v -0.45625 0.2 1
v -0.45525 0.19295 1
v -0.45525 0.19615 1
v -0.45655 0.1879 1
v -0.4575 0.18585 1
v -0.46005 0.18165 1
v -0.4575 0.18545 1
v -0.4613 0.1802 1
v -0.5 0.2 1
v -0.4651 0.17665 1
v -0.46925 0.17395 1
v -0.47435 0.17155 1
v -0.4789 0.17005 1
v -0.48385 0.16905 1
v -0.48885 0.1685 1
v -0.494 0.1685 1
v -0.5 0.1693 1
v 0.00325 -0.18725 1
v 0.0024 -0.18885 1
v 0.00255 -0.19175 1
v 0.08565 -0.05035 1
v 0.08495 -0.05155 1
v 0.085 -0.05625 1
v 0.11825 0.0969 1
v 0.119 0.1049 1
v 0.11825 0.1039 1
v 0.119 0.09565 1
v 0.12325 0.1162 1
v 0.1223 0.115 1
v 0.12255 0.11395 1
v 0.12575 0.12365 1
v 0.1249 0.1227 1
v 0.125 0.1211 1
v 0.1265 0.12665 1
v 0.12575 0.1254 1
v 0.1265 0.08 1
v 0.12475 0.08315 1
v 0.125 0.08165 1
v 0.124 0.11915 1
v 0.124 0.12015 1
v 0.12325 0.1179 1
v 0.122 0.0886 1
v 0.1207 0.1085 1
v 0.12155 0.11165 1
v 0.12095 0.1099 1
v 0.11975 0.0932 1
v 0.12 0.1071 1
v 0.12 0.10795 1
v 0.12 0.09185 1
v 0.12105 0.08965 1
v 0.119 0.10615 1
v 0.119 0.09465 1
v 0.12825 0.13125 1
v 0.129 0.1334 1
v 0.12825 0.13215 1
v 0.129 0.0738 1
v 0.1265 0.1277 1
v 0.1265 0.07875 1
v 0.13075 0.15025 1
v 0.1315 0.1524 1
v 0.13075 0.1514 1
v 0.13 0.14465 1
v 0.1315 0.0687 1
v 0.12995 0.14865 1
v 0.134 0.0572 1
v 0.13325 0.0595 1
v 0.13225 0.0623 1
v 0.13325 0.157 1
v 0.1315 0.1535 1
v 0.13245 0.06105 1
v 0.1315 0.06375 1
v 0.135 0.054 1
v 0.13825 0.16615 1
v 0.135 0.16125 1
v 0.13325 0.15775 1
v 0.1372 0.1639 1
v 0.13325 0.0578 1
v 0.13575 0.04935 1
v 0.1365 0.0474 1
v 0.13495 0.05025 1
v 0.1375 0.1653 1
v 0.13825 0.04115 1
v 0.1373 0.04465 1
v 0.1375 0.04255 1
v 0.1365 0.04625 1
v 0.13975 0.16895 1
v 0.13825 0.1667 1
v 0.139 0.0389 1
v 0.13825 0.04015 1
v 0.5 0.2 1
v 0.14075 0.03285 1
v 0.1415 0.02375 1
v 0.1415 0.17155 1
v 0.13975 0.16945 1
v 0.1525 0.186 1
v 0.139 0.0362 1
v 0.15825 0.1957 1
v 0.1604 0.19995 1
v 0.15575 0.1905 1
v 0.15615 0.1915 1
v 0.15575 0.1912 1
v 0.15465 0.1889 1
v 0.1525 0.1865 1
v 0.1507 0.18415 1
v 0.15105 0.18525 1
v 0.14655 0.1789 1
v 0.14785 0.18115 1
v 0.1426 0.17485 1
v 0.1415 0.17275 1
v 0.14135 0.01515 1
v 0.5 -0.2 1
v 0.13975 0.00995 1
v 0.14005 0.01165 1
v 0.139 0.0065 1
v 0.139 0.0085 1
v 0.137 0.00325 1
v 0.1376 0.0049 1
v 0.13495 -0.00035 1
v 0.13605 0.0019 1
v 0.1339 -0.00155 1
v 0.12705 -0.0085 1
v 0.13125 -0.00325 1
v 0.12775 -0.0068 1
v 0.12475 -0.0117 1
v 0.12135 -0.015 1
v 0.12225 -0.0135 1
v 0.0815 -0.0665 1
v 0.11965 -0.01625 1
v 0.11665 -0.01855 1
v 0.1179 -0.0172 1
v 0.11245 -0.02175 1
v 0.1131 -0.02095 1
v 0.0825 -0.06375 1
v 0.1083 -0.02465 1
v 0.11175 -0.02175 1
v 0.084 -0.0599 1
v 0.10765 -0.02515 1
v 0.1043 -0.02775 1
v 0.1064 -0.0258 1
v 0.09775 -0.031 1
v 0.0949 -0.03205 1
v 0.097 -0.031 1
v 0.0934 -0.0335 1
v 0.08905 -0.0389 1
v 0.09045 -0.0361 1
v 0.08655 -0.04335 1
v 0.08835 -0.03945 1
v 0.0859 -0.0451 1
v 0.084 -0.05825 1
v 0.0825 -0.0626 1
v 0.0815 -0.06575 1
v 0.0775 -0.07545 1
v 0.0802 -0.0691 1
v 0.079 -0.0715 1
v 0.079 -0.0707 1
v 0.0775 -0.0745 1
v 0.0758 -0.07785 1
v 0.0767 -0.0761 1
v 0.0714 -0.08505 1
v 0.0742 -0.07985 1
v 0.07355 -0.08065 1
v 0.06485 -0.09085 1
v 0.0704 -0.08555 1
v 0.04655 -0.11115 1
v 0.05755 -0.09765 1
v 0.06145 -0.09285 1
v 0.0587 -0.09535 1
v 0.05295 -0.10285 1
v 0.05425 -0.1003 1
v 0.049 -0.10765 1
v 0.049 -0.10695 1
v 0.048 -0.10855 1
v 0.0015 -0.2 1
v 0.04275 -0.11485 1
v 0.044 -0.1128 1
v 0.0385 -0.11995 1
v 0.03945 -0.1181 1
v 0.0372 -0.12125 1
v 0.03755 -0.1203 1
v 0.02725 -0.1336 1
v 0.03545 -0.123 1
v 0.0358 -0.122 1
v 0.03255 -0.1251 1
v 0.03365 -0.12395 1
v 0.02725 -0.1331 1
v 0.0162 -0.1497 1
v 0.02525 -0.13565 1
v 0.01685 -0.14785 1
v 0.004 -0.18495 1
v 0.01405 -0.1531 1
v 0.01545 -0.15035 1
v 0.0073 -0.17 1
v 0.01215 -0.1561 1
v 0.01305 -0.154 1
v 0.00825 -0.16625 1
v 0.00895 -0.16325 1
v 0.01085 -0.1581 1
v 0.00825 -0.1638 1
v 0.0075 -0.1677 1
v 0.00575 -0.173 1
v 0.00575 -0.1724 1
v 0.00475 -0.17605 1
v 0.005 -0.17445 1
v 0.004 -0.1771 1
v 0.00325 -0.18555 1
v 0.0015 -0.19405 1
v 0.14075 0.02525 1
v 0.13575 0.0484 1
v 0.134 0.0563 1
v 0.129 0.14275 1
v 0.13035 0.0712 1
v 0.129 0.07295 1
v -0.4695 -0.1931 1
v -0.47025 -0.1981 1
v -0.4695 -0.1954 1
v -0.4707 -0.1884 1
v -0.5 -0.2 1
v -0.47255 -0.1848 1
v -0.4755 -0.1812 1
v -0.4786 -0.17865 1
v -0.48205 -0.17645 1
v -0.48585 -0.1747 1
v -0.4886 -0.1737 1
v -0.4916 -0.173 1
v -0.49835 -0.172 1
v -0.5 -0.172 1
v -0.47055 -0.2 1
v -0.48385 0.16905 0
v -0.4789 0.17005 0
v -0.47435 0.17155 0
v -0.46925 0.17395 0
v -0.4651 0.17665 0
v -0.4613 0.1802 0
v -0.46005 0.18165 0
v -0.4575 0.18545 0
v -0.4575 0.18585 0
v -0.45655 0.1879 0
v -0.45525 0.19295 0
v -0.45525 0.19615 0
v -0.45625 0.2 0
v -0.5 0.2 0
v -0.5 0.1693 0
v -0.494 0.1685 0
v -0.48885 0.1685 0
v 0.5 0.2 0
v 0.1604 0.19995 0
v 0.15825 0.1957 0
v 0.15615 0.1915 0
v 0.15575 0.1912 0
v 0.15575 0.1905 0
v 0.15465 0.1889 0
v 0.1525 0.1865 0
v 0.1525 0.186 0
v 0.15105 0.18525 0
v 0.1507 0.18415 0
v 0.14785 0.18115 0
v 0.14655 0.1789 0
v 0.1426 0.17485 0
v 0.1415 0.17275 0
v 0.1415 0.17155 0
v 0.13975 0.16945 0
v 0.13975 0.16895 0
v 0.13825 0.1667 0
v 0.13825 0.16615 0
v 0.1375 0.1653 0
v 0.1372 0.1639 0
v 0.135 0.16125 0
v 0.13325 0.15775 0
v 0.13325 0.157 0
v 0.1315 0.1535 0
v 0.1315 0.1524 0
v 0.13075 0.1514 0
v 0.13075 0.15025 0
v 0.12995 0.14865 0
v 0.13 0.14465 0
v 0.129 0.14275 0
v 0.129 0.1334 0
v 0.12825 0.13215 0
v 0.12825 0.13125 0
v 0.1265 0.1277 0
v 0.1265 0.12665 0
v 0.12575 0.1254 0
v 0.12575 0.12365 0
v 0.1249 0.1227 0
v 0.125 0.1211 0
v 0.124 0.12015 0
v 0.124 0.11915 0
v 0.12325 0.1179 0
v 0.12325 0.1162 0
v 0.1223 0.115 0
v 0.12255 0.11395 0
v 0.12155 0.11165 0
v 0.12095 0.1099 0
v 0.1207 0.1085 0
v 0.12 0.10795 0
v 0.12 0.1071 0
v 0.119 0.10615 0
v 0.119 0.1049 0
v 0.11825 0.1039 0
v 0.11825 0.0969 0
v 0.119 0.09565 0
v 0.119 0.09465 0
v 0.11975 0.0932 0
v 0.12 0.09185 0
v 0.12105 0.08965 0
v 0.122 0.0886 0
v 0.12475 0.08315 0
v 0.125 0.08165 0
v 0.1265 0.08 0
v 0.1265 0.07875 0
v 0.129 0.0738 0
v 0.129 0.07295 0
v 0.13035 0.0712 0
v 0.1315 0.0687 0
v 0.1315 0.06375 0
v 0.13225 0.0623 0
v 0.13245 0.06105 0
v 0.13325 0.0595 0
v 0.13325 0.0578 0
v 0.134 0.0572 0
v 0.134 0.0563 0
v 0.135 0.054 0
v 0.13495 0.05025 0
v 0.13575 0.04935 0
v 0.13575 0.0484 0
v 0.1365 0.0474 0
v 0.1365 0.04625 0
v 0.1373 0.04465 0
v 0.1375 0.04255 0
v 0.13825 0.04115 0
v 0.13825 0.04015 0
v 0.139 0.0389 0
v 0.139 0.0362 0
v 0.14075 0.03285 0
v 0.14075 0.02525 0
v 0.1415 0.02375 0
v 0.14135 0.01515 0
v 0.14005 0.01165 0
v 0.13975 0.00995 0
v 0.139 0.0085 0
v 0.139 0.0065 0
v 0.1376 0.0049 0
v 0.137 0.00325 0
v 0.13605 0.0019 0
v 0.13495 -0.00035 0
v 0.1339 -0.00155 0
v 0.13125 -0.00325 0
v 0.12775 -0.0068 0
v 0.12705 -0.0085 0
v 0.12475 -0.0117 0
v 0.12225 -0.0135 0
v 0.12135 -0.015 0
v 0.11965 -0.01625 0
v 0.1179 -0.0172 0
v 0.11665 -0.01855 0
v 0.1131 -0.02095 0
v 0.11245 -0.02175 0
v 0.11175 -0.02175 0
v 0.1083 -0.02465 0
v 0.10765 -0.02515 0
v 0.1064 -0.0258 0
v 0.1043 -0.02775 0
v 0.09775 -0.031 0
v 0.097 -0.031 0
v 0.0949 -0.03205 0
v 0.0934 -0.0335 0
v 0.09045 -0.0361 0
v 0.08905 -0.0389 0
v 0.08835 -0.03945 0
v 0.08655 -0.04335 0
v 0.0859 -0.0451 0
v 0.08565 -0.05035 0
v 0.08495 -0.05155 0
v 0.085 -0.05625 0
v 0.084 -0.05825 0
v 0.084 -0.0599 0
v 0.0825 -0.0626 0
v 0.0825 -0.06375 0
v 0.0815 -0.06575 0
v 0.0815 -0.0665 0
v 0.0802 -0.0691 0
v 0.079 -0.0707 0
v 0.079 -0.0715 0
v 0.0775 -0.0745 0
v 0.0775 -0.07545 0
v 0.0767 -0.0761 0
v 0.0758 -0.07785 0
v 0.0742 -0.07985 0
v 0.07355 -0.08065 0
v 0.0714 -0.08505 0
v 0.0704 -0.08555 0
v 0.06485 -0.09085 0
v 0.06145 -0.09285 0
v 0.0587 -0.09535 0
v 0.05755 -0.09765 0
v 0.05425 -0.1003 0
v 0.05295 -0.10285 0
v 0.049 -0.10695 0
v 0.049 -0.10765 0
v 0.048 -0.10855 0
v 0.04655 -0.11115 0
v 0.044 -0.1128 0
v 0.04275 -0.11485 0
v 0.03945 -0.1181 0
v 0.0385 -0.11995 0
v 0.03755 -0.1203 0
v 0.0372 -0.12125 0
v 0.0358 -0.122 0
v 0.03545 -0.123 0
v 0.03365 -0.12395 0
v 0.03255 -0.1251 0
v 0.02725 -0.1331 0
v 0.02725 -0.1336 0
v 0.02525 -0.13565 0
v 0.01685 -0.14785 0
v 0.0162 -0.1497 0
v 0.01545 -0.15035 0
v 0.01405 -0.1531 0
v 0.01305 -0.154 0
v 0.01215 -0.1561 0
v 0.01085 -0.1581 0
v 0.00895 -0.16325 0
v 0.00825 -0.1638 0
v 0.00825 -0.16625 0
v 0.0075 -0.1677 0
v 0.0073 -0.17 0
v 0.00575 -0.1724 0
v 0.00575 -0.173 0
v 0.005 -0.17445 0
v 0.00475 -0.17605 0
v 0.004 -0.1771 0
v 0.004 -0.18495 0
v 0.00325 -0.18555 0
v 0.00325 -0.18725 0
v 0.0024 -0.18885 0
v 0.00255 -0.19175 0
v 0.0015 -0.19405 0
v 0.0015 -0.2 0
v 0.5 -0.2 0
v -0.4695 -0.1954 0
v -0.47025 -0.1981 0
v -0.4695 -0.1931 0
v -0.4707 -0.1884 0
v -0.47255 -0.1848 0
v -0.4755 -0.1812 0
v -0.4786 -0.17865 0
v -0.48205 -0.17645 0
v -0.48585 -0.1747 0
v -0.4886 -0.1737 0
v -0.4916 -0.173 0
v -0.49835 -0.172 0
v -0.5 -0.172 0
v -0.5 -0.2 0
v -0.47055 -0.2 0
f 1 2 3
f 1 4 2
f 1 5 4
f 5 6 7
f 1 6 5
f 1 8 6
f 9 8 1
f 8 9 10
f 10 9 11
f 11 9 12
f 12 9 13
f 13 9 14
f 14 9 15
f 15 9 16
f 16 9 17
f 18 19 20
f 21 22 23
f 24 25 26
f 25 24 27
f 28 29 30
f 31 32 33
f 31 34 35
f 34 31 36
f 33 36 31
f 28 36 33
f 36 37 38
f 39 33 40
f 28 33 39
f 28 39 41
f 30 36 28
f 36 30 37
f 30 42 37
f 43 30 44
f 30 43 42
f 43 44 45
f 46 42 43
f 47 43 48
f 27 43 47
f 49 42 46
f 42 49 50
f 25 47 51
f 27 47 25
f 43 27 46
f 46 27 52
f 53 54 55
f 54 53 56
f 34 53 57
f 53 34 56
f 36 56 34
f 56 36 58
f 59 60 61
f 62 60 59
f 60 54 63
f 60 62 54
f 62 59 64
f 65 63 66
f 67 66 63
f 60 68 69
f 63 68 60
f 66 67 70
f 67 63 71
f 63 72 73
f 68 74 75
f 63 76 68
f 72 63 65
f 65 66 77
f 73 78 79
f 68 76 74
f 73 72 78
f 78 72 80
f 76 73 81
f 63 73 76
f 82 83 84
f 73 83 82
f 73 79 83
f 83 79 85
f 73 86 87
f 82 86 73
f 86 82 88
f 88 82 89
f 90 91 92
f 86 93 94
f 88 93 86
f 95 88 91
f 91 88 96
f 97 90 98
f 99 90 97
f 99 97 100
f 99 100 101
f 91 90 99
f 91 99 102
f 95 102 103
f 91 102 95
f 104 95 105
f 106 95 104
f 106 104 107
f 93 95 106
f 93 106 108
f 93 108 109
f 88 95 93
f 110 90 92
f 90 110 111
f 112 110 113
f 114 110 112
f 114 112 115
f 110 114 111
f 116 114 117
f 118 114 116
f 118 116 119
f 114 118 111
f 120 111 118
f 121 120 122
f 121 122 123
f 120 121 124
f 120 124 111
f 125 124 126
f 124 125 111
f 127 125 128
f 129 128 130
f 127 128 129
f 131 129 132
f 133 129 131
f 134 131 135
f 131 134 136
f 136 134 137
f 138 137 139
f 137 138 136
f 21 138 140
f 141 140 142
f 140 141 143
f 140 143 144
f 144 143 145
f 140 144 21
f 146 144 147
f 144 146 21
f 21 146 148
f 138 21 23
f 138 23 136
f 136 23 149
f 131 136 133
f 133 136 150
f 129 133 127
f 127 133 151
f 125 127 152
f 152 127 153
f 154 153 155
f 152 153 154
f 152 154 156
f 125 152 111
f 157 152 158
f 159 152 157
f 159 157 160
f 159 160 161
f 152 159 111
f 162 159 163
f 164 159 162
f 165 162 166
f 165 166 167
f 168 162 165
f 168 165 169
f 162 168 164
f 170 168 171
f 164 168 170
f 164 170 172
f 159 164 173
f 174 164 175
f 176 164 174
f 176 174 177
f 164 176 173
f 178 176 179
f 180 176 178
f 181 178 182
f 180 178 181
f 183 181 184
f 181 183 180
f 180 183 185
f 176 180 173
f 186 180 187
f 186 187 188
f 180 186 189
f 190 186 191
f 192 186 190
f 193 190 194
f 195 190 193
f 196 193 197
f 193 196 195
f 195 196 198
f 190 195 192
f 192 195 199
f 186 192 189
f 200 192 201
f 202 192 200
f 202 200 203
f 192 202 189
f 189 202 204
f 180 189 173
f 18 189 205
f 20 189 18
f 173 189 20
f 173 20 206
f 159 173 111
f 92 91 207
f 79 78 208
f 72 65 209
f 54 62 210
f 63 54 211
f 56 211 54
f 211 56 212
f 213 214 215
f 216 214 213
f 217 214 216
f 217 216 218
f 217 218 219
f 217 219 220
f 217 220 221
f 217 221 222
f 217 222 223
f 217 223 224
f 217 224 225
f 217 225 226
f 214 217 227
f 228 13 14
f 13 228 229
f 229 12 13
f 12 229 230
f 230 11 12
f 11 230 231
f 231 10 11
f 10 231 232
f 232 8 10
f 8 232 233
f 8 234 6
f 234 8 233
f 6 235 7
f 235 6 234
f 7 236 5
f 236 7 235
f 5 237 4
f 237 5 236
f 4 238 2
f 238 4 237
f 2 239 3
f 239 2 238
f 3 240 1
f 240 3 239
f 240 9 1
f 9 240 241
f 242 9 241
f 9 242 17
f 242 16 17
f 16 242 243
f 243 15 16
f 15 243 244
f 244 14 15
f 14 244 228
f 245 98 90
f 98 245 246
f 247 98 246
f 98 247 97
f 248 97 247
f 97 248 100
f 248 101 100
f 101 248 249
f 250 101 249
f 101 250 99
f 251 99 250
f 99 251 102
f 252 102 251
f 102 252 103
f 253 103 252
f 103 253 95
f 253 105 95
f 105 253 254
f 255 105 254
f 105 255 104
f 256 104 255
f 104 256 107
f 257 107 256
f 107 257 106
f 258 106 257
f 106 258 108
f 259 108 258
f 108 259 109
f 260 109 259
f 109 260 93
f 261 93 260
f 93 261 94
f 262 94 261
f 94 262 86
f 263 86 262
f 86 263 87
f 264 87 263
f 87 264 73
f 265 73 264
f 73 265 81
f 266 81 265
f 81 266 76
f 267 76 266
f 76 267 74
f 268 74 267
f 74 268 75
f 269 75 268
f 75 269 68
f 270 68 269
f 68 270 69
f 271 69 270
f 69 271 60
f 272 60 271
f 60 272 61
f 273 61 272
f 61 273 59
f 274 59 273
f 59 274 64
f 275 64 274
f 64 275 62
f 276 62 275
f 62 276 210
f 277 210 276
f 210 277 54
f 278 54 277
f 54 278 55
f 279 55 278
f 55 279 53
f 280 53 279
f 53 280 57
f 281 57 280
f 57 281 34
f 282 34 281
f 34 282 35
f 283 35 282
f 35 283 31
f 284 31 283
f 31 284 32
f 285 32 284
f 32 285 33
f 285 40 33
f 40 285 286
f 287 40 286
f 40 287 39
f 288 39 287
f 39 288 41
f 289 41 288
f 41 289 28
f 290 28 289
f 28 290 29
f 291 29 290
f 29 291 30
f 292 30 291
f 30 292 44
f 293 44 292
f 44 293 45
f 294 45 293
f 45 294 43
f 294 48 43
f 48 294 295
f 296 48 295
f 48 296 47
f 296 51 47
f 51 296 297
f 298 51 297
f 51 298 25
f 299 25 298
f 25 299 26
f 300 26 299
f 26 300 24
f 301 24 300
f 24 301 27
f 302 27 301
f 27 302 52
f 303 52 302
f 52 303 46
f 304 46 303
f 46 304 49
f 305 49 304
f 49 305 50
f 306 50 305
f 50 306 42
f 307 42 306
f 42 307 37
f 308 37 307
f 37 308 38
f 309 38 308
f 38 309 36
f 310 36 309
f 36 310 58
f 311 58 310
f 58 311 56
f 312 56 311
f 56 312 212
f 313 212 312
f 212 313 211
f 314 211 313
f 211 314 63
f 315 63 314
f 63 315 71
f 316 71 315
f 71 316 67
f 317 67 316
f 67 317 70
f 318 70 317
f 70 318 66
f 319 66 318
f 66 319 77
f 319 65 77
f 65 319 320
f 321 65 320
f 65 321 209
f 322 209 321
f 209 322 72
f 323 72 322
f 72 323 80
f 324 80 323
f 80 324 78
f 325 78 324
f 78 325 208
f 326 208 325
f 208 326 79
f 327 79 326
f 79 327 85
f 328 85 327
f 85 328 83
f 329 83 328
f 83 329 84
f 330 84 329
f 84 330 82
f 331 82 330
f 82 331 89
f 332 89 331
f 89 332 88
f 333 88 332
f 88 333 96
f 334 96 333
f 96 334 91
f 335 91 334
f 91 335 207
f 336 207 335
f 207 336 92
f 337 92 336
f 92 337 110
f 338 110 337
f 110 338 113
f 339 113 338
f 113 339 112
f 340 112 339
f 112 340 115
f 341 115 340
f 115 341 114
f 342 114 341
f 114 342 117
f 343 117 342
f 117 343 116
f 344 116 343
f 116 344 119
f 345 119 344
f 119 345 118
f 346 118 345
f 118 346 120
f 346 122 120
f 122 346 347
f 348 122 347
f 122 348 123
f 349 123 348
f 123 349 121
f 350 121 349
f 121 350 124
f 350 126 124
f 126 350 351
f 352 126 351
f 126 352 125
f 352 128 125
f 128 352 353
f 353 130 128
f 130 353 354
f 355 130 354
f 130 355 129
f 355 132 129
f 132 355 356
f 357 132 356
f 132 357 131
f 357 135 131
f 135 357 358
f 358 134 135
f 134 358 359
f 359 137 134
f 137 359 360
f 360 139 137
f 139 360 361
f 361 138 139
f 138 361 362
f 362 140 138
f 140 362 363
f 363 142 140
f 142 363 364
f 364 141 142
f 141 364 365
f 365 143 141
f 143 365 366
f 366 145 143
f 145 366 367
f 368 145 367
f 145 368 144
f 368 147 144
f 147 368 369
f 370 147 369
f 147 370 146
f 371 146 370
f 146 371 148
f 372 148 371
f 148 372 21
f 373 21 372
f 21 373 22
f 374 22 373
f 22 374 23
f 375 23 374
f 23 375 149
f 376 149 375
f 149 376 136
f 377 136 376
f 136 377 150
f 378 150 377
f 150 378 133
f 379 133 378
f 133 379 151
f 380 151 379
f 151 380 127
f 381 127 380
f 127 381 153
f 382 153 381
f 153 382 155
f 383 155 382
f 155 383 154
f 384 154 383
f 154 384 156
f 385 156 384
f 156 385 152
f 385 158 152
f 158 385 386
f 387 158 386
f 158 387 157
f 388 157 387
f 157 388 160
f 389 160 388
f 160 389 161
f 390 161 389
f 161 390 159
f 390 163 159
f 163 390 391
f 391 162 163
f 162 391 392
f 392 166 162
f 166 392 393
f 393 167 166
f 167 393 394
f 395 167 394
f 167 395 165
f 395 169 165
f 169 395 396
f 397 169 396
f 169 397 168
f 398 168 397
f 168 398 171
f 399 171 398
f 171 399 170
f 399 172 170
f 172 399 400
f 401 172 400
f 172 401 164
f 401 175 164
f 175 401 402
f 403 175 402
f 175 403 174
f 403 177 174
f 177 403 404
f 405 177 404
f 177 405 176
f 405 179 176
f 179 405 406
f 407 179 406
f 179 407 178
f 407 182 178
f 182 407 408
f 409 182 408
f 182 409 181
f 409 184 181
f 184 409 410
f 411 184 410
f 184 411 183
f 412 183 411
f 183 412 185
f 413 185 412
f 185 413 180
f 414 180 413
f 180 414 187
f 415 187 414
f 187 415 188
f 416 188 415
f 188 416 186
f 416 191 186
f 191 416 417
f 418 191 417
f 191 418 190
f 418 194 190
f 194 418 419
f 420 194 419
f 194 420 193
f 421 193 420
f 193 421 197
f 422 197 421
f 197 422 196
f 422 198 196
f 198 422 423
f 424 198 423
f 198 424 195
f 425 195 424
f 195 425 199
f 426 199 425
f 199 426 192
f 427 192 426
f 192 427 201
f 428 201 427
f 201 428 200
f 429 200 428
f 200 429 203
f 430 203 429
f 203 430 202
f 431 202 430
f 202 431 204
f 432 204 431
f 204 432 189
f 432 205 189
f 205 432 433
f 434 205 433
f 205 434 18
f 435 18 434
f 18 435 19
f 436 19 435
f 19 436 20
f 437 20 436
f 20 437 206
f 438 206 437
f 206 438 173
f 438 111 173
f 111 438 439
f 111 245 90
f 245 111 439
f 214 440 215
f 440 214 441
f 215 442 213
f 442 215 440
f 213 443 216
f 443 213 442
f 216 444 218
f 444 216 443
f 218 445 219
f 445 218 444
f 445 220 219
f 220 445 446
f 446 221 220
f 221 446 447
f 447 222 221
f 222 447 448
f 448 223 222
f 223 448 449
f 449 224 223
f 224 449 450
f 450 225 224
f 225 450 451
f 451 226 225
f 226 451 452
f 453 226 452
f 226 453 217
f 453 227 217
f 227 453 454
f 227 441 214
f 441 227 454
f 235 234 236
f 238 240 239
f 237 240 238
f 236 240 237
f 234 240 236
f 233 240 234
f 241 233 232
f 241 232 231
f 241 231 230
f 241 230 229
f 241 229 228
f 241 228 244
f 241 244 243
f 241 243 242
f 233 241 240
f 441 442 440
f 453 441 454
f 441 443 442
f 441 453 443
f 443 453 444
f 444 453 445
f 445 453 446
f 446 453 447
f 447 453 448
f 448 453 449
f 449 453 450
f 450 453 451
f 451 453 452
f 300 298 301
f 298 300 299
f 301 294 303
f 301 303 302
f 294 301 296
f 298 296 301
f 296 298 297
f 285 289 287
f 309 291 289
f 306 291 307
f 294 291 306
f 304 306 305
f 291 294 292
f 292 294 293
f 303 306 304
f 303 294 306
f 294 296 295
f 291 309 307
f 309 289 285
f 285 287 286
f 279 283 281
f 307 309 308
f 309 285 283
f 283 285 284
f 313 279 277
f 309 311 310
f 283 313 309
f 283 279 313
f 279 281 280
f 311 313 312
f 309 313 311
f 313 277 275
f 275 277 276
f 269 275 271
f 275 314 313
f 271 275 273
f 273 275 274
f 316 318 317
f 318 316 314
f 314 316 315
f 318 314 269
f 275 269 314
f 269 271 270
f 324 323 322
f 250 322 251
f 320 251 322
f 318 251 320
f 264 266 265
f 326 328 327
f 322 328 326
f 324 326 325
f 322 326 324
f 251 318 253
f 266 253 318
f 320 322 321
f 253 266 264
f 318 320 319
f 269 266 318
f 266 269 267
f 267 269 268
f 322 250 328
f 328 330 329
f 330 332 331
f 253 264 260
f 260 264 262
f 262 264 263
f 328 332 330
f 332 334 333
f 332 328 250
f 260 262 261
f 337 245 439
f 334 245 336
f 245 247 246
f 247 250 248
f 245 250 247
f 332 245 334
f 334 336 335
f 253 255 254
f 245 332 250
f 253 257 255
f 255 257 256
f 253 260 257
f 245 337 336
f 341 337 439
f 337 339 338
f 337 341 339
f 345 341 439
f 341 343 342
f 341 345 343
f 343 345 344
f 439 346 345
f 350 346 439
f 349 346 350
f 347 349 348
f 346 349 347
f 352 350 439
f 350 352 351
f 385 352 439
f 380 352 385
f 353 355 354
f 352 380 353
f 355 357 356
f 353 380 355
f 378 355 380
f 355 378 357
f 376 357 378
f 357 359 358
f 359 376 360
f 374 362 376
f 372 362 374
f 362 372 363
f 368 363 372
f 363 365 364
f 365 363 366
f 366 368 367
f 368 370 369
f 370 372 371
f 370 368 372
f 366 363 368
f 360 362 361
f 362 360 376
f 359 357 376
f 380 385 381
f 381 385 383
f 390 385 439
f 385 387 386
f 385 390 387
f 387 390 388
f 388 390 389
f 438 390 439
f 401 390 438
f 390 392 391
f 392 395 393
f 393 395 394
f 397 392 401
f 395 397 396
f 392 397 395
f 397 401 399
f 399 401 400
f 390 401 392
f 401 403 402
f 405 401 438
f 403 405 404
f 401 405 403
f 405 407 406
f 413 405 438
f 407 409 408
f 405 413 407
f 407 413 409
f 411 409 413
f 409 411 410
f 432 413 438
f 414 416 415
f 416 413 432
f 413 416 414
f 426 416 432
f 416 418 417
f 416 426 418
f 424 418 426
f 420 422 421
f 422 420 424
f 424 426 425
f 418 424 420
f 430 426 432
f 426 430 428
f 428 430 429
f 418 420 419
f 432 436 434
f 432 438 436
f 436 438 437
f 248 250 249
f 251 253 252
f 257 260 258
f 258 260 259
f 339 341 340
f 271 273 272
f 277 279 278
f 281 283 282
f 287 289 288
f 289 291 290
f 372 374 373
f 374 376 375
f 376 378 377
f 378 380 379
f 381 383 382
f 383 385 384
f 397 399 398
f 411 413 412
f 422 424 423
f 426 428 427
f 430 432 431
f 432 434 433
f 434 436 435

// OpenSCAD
module card5red_1()
{
 /* Generated by trace2scad version 20150415
    http://aggregate.org/MAKE/TRACE2SCAD/
    Optimized model has 229/469 original points
 */
 color([0.5, 0.5, 0.5])
 assign(minx=0) /* polygon minx=0 */
 assign(miny=0) /* polygon miny=0 */
 assign(maxx=20000) /* polygon maxx=20000 */
 assign(maxy=8000) /* polygon maxy=8000 */
 assign(dx=maxx-minx)
 assign(dy=maxy-miny)
 assign(maxd=((dx>dy)?dx:dy))
 scale([1/maxd, 1/maxd, 1])
 translate([-minx-dx/2, -miny-dy/2, 0])
 linear_extrude(height=1, convexity=229)
 union() {
  union() {
   polygon([[0,7693],[0,7386],[120,7370],[223,7370],[323,7381],[422,7401],[513,7431],[615,7479],[698,7533],[774,7604],[799,7633],[850,7709],[850,7717],[869,7758],[895,7859],[895,7923],[875,8000],[0,8000]], convexity=5);
   polygon([[13165,7914],[13123,7830],[13115,7824],[13115,7810],[13093,7778],[13050,7730],[13050,7720],[13021,7705],[13014,7683],[12957,7623],[12931,7578],[12852,7497],[12830,7455],[12830,7431],[12795,7389],[12795,7379],[12765,7334],[12765,7323],[12750,7306],[12744,7278],[12700,7225],[12665,7155],[12665,7140],[12630,7070],[12630,7048],[12615,7028],[12615,7005],[12599,6973],[12600,6893],[12580,6855],[12580,6668],[12565,6643],[12565,6625],[12530,6554],[12530,6533],[12515,6508],[12515,6473],[12498,6454],[12500,6422],[12480,6403],[12480,6383],[12465,6358],[12465,6324],[12446,6300],[12451,6279],[12431,6233],[12419,6198],[12414,6170],[12400,6159],[12400,6142],[12380,6123],[12380,6098],[12365,6078],[12365,5938],[12380,5913],[12380,5893],[12395,5864],[12400,5837],[12421,5793],[12440,5772],[12495,5663],[12500,5633],[12530,5600],[12530,5575],[12580,5476],[12580,5459],[12607,5424],[12630,5374],[12630,5275],[12645,5246],[12649,5221],[12665,5190],[12665,5156],[12680,5144],[12680,5126],[12700,5080],[12699,5005],[12715,4987],[12715,4968],[12730,4948],[12730,4925],[12746,4893],[12750,4851],[12765,4823],[12765,4803],[12780,4778],[12780,4724],[12815,4657],[12815,4505],[12830,4475],[12827,4303],[12801,4233],[12795,4199],[12780,4170],[12780,4130],[12752,4098],[12740,4065],[12721,4038],[12699,3993],[12678,3969],[12625,3935],[12555,3864],[12541,3830],[12495,3766],[12445,3730],[12427,3700],[12393,3675],[12358,3656],[12333,3629],[12262,3581],[12249,3565],[12235,3565],[12166,3507],[12153,3497],[12128,3484],[12086,3445],[11955,3380],[11940,3380],[11898,3359],[11868,3330],[11809,3278],[11781,3222],[11767,3211],[11731,3133],[11718,3098],[11713,2993],[11699,2969],[11700,2875],[11680,2835],[11680,2802],[11650,2748],[11650,2725],[11630,2685],[11630,2670],[11604,2618],[11580,2586],[11580,2570],[11550,2510],[11550,2491],[11534,2478],[11516,2443],[11484,2403],[11471,2387],[11428,2299],[11408,2289],[11297,2183],[11229,2143],[11174,2093],[11151,2047],[11085,1994],[11059,1943],[10980,1861],[10980,1847],[10960,1829],[10931,1777],[10880,1744],[10855,1703],[10789,1638],[10770,1601],[10751,1594],[10744,1575],[10716,1560],[10709,1540],[10673,1521],[10651,1498],[10545,1338],[10545,1328],[10505,1287],[10337,1043],[10324,1006],[10309,993],[10281,938],[10261,920],[10243,878],[10217,838],[10179,735],[10165,724],[10165,675],[10150,646],[10146,600],[10115,552],[10115,540],[10100,511],[10095,479],[10080,458],[10080,301],[10065,289],[10065,255],[10048,223],[10051,165],[10030,119],[10030,0],[20000,0],[20000,8000],[13208,7999]], convexity=80);
   polygon([[0,280],[0,0],[589,0],[595,38],[610,92],[610,138],[586,232],[549,304],[490,376],[428,427],[359,471],[283,506],[228,526],[168,540],[33,560],[0,560]], convexity=5);
  }
 }
}

module card5red()
{
 /* all layers combined, scaled to within a 1mm cube */
 scale([1, 1, 1/1])
 difference() {
  union() {
   scale([1,1,2]) translate([0,0,-0.5]) card5red_1();
  }
  translate([0,0,-2]) cube([2,2,4],center=true);
 }
}
card5red();
